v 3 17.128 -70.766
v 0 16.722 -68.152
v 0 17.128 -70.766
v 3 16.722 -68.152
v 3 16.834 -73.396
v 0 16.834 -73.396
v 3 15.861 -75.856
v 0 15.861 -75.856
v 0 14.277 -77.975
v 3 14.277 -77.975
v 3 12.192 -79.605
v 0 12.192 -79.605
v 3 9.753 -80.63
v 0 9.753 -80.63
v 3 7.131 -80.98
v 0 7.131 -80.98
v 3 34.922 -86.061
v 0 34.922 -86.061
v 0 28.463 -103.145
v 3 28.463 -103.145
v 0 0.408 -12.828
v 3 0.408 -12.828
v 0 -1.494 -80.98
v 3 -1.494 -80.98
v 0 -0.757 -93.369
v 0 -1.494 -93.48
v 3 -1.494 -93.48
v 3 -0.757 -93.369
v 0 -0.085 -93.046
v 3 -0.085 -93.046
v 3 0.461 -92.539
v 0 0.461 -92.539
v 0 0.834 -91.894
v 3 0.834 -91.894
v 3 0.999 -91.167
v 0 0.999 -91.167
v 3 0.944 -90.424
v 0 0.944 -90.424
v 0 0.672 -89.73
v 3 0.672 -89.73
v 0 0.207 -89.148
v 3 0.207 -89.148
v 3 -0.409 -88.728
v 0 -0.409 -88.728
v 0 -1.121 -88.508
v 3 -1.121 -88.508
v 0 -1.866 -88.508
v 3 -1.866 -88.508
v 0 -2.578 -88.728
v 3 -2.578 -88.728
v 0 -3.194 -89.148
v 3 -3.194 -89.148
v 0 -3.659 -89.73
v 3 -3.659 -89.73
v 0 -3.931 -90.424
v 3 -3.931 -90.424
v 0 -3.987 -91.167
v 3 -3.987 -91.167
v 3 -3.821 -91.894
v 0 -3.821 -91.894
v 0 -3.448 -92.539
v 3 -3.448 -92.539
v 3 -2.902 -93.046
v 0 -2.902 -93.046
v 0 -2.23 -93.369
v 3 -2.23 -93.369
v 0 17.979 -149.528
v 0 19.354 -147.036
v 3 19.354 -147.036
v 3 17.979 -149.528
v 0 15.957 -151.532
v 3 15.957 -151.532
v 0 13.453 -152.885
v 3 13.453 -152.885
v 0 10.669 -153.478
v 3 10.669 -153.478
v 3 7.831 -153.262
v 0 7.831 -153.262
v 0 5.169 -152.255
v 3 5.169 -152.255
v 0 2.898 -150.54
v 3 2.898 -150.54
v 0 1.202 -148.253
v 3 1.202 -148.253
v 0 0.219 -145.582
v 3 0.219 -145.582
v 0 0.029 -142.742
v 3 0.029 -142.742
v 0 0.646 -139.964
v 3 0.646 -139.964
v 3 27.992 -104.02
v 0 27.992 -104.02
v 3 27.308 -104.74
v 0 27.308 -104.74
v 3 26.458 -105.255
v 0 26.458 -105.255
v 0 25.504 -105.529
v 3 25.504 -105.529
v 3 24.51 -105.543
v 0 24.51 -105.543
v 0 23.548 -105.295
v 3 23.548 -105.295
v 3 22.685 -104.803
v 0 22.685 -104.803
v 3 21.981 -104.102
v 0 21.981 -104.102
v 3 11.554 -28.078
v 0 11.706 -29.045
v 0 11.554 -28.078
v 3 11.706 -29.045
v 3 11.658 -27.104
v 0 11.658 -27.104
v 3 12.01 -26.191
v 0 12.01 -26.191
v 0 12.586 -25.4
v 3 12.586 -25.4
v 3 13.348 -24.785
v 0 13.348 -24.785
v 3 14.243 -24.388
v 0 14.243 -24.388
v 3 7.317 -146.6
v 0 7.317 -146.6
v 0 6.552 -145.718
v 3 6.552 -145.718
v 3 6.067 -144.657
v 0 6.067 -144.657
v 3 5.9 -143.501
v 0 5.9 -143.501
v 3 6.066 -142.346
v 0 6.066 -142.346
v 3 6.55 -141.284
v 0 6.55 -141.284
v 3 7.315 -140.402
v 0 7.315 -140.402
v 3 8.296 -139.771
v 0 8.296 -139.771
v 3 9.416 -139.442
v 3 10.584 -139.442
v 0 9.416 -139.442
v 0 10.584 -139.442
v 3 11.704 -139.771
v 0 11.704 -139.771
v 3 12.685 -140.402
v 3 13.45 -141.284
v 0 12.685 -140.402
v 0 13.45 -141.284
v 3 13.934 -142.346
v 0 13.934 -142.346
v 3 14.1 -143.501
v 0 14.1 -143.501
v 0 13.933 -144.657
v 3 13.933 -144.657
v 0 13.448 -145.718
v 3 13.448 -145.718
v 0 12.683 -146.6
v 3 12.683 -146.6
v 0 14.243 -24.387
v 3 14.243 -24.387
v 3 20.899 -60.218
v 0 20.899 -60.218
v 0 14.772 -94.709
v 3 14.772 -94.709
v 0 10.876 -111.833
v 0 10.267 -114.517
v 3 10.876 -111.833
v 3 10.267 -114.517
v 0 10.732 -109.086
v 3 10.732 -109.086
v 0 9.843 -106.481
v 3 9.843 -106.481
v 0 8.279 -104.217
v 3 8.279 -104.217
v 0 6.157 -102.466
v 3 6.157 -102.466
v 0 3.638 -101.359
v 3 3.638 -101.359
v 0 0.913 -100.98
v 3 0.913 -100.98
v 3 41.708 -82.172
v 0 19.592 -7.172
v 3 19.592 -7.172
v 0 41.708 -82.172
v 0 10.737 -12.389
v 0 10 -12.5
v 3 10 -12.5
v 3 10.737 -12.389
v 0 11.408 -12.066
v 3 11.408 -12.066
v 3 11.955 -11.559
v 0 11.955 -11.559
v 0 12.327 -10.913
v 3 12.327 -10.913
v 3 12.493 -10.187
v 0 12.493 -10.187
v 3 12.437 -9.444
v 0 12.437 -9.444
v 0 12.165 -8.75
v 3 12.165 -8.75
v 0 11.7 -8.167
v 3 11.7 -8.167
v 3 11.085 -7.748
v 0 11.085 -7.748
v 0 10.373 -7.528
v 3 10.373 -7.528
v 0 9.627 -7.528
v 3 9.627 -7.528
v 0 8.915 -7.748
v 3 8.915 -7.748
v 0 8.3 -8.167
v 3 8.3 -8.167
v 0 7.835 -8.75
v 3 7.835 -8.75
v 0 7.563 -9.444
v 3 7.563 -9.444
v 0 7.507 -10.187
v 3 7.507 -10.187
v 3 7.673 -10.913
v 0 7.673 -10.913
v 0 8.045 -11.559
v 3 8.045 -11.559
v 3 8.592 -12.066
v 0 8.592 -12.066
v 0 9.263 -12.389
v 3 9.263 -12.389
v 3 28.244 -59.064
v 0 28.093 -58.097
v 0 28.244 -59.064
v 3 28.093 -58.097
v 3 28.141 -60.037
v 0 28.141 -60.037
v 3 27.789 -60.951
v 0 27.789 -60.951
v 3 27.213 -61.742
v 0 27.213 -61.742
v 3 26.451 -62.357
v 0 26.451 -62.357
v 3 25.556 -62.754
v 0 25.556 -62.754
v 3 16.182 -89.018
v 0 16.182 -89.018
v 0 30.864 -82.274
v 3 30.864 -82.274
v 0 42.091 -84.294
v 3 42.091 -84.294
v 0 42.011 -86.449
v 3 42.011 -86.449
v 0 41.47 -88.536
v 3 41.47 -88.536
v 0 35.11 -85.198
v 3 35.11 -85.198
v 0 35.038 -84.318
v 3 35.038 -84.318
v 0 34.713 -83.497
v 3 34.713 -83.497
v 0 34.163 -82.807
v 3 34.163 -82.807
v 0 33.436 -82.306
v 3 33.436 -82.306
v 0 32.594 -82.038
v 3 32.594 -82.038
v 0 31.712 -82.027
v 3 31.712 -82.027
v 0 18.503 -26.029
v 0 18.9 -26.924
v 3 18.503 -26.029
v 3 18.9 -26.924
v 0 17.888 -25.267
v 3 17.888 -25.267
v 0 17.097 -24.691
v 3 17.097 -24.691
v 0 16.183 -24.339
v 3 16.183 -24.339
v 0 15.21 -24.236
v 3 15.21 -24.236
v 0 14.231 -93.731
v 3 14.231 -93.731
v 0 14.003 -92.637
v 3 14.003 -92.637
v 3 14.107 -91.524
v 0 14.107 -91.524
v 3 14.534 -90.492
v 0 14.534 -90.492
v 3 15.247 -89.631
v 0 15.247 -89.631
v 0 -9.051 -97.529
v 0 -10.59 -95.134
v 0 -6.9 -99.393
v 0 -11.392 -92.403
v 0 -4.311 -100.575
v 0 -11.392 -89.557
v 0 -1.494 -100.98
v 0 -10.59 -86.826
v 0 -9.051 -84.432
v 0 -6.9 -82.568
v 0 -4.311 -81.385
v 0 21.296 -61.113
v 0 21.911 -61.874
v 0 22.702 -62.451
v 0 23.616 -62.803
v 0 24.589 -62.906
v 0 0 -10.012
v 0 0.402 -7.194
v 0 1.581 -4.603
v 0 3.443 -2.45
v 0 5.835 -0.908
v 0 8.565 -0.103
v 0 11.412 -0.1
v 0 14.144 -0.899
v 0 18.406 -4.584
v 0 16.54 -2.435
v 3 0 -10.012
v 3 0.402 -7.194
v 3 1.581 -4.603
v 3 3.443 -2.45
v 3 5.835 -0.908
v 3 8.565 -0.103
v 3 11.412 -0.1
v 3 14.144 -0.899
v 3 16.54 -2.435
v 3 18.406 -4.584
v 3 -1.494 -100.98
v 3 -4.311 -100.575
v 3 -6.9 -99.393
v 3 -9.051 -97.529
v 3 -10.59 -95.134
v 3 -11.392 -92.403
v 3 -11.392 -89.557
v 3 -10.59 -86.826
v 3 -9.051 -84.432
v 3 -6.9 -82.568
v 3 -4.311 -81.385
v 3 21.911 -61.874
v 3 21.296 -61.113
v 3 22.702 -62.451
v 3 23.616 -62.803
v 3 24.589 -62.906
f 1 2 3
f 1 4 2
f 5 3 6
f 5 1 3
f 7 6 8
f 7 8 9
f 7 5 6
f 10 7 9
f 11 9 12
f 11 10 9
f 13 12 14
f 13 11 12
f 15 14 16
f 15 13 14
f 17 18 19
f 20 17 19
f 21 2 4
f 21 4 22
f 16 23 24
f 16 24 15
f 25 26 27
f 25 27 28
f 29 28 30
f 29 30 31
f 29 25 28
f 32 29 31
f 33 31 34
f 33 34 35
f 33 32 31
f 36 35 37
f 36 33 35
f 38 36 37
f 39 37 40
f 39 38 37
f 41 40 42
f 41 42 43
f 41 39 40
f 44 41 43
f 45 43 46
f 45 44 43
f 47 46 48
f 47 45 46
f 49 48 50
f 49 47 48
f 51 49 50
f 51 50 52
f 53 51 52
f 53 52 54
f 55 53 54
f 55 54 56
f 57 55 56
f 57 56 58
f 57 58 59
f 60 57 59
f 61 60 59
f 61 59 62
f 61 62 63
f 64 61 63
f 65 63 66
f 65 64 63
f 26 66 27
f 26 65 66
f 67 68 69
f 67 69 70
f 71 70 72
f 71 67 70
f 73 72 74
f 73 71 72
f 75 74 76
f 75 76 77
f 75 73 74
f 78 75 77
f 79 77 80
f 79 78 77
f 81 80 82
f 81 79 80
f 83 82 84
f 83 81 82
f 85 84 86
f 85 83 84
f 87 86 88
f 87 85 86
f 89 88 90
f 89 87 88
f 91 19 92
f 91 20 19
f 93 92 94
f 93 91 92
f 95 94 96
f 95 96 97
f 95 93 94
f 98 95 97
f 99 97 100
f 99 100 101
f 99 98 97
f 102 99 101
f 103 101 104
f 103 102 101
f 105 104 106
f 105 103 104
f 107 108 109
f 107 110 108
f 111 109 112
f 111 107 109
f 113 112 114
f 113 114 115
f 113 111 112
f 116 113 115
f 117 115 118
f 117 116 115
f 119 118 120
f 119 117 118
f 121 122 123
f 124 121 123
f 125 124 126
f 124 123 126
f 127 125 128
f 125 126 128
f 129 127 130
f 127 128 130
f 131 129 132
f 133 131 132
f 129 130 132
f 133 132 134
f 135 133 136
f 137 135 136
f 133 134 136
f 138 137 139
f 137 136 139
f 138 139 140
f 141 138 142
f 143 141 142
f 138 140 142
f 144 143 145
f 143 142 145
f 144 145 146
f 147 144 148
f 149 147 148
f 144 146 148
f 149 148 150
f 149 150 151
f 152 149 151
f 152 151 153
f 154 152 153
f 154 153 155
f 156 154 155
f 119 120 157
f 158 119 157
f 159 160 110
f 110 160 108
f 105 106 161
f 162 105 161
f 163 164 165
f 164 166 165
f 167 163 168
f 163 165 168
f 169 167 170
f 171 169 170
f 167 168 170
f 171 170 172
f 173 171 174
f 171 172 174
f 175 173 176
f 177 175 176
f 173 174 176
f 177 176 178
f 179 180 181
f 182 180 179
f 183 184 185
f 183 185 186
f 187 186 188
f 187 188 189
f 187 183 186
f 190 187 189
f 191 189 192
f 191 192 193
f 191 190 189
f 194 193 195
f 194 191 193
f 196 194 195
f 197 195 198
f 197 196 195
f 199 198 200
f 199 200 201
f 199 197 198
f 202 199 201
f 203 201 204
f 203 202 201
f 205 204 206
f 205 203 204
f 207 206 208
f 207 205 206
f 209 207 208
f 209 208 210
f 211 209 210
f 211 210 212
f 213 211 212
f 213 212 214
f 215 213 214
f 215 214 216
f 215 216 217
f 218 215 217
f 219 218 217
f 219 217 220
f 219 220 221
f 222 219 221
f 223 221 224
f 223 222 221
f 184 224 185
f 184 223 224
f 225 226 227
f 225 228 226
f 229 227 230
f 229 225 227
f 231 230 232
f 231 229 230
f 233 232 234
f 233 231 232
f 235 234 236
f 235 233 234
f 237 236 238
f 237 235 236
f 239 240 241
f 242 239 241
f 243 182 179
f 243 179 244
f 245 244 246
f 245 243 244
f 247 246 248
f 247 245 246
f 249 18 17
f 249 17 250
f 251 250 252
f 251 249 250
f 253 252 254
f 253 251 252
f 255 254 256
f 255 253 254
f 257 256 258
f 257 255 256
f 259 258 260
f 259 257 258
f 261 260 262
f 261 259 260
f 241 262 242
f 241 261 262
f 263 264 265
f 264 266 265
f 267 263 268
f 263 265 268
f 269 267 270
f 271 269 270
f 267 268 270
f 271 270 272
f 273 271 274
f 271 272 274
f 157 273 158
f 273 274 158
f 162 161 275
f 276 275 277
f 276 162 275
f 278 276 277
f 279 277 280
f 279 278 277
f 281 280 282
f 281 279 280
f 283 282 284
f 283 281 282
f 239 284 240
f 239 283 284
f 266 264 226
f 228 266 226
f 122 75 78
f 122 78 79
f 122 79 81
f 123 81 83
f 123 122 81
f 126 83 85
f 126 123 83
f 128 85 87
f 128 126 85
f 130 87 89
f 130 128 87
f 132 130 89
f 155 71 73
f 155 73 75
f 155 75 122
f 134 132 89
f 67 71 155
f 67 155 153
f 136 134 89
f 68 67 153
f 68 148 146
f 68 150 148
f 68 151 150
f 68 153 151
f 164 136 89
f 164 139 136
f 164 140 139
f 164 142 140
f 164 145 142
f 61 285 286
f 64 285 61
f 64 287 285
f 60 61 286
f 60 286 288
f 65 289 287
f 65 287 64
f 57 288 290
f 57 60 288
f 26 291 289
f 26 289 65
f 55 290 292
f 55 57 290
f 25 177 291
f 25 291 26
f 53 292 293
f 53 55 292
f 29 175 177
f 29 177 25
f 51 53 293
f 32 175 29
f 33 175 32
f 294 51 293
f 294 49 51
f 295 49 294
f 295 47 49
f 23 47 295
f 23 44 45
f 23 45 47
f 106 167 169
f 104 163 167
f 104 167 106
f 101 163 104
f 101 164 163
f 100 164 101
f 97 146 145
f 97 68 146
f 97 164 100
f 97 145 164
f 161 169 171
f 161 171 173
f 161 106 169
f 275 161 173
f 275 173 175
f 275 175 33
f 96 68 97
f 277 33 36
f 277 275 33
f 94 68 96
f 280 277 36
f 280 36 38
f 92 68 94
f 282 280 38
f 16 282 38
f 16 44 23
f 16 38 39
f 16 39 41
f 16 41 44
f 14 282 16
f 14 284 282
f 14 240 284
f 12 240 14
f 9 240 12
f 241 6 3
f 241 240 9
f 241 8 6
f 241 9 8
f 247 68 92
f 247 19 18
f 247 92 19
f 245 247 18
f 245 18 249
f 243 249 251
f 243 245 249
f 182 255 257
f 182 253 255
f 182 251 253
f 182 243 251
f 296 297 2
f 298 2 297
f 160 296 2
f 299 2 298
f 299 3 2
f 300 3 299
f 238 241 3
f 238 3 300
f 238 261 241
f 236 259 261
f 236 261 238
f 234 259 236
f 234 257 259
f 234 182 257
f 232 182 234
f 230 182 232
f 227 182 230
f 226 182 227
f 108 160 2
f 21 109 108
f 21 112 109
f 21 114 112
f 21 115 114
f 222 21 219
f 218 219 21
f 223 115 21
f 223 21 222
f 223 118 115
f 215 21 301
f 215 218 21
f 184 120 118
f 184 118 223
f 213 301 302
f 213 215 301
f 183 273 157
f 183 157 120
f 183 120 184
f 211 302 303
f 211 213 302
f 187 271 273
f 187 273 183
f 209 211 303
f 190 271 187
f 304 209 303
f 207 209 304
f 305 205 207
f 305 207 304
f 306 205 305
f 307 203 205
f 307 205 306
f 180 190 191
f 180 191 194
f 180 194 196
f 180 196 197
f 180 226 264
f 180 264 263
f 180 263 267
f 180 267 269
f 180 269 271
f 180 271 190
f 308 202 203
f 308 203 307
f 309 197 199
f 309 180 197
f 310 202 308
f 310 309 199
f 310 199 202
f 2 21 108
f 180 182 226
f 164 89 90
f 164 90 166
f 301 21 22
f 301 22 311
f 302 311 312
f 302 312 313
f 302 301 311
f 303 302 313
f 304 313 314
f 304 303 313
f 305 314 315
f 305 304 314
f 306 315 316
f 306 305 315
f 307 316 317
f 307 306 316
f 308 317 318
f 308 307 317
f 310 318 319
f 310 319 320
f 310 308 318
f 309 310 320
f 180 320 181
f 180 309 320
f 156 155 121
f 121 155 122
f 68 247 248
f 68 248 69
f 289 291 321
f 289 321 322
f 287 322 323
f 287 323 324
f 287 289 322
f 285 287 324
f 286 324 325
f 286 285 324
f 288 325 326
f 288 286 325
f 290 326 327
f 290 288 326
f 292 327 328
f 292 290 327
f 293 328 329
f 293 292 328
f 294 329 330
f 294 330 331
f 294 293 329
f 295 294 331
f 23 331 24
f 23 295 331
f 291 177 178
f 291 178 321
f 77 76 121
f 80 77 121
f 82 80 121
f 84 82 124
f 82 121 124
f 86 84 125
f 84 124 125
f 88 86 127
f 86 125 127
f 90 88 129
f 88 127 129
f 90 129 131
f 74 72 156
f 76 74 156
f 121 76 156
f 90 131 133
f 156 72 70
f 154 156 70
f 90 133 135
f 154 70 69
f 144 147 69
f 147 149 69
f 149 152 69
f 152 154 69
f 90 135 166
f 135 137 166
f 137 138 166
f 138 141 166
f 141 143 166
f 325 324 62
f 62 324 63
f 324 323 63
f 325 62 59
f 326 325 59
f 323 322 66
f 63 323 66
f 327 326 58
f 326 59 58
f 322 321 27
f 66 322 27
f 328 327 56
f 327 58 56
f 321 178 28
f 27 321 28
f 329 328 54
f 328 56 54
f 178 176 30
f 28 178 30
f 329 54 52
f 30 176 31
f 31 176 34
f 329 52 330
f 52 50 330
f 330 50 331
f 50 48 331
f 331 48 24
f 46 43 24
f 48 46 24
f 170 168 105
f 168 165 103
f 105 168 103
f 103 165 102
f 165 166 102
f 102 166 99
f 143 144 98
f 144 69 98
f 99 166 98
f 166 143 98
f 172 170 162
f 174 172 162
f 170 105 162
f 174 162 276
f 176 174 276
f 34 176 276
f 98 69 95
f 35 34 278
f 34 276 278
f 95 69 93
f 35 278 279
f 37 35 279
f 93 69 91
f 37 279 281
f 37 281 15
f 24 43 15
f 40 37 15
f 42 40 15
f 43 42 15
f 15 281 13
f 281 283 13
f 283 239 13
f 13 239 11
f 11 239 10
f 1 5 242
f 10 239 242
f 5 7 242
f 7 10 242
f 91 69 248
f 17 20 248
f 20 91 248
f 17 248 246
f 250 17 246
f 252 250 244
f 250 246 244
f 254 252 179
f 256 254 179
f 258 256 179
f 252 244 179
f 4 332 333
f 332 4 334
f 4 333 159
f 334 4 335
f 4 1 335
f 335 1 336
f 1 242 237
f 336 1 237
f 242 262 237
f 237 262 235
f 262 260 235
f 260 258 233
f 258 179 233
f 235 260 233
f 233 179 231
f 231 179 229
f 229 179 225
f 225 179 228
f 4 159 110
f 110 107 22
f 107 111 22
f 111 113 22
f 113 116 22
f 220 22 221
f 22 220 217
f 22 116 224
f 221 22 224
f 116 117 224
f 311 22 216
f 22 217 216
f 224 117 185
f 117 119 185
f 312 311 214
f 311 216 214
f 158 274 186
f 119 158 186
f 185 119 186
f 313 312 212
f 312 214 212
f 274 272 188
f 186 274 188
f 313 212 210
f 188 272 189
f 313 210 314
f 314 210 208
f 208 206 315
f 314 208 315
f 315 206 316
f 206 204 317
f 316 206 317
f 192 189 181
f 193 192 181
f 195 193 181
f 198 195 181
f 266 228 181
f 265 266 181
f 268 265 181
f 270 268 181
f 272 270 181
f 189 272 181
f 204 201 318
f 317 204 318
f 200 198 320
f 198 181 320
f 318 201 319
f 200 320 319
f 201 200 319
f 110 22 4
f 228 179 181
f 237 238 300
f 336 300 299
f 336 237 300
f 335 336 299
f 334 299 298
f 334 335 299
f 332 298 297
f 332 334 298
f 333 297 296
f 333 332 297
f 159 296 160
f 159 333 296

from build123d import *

# Parameters (mm, degrees)
SKETCH3_R           = 3
SKETCH3_R_2         = 2.5
BOSS_EXTRUDE2_DEPTH = 3
FILLET1_R           = 10
CUT_EXTRUDE1_DEPTH  = 10
FILLET2_R           = 3.75


with BuildPart() as part:
    # Sketch3 → Boss-Extrude2 (new body)
    with BuildSketch(Plane(origin=(0, 0, 0), x_dir=(0, 0, -1), z_dir=(1, 0, 0))):
        with BuildLine():
            Line((7.171582169, 19.591665787), (82.171582169, 41.707880218))
            ThreePointArc((82.171582169, 41.707880218), (85.373366716, 42.109241865), (88.536274395, 41.470077986))
            Line((88.536274395, 41.470077986), (147.036274395, 19.353863555))
            ThreePointArc((147.036274395, 19.353863555), (152.853863555, 6.463725605), (139.963725605, 0.646136445))
            Line((139.963725605, 0.646136445), (100.980229255, 15.384040113))
            Line((100.980229255, 15.384040113), (100.980229255, -1.493532665))
            ThreePointArc((100.980229255, -1.493532665), (90.980229255, -11.493532665), (80.980229255, -1.493532665))
            Line((80.980229255, -1.493532665), (80.980229255, 20.505135217))
            Line((80.980229255, 20.505135217), (12.828417831, 0.408334213))
            ThreePointArc((12.828417831, 0.408334213), (0.408334213, 7.171582169), (7.171582169, 19.591665787))
        make_face()
        with Locations((85, 32.116214431)):
            Circle(SKETCH3_R, mode=Mode.SUBTRACT)
        with Locations((90.980229255, -1.493532665)):
            Circle(SKETCH3_R_2, mode=Mode.SUBTRACT)
        with Locations((10, 10)):
            Circle(SKETCH3_R_2, mode=Mode.SUBTRACT)
        with BuildLine():
            Line((146.6, 12.683281573), (146.6, 7.316718427))
            ThreePointArc((146.6, 7.316718427), (139.4, 10), (146.6, 12.683281573))
        make_face(mode=Mode.SUBTRACT)
    extrude(amount=BOSS_EXTRUDE2_DEPTH)

    # Fillet1
    fillet1_edges = [part.edges().sort_by_distance(p)[0] for p in [
        (1.5, 20.505135217, -80.980229255),
        (1.5, 15.384040113, -100.980229255),
    ]]
    fillet(fillet1_edges, radius=FILLET1_R)

    # Sketch5 → Cut-Extrude1 (cut)
    with BuildSketch(Plane(origin=(0, 0, 0), x_dir=(0, 0, -1), z_dir=(1, 0, 0))):
        Polygon((23.326841994, 17.839501416), (61.693505144, 29.153172739), (63.814818517, 21.959423399), (25.448155367, 10.645752076), align=None)
        with BuildLine():
            Line((86.060882319, 34.922373497), (109.445541205, 26.081687509))
            Line((109.445541205, 26.081687509), (90.980229255, 11.910433147))
            Line((90.980229255, 11.910433147), (82.273860108, 30.863951963))
            ThreePointArc((82.273860108, 30.863951963), (82.806608326, 34.162927153), (86.060882319, 34.922373497))
        make_face()
    extrude(amount=CUT_EXTRUDE1_DEPTH, mode=Mode.SUBTRACT)

    # Fillet2
    fillet2_edges = [part.edges().sort_by_distance(p)[0] for p in [
        (1.5, 11.910433147, -90.980229255),
        (1.5, 26.081687509, -109.445541205),
        (1.5, 29.153172739, -61.693505144),
        (1.5, 21.959423399, -63.814818517),
        (1.5, 10.645752076, -25.448155367),
        (1.5, 17.839501416, -23.326841994),
    ]]
    fillet(fillet2_edges, radius=FILLET2_R - 0.0001)  # a hair under: the kernel refuses the full size


solid = part.part
